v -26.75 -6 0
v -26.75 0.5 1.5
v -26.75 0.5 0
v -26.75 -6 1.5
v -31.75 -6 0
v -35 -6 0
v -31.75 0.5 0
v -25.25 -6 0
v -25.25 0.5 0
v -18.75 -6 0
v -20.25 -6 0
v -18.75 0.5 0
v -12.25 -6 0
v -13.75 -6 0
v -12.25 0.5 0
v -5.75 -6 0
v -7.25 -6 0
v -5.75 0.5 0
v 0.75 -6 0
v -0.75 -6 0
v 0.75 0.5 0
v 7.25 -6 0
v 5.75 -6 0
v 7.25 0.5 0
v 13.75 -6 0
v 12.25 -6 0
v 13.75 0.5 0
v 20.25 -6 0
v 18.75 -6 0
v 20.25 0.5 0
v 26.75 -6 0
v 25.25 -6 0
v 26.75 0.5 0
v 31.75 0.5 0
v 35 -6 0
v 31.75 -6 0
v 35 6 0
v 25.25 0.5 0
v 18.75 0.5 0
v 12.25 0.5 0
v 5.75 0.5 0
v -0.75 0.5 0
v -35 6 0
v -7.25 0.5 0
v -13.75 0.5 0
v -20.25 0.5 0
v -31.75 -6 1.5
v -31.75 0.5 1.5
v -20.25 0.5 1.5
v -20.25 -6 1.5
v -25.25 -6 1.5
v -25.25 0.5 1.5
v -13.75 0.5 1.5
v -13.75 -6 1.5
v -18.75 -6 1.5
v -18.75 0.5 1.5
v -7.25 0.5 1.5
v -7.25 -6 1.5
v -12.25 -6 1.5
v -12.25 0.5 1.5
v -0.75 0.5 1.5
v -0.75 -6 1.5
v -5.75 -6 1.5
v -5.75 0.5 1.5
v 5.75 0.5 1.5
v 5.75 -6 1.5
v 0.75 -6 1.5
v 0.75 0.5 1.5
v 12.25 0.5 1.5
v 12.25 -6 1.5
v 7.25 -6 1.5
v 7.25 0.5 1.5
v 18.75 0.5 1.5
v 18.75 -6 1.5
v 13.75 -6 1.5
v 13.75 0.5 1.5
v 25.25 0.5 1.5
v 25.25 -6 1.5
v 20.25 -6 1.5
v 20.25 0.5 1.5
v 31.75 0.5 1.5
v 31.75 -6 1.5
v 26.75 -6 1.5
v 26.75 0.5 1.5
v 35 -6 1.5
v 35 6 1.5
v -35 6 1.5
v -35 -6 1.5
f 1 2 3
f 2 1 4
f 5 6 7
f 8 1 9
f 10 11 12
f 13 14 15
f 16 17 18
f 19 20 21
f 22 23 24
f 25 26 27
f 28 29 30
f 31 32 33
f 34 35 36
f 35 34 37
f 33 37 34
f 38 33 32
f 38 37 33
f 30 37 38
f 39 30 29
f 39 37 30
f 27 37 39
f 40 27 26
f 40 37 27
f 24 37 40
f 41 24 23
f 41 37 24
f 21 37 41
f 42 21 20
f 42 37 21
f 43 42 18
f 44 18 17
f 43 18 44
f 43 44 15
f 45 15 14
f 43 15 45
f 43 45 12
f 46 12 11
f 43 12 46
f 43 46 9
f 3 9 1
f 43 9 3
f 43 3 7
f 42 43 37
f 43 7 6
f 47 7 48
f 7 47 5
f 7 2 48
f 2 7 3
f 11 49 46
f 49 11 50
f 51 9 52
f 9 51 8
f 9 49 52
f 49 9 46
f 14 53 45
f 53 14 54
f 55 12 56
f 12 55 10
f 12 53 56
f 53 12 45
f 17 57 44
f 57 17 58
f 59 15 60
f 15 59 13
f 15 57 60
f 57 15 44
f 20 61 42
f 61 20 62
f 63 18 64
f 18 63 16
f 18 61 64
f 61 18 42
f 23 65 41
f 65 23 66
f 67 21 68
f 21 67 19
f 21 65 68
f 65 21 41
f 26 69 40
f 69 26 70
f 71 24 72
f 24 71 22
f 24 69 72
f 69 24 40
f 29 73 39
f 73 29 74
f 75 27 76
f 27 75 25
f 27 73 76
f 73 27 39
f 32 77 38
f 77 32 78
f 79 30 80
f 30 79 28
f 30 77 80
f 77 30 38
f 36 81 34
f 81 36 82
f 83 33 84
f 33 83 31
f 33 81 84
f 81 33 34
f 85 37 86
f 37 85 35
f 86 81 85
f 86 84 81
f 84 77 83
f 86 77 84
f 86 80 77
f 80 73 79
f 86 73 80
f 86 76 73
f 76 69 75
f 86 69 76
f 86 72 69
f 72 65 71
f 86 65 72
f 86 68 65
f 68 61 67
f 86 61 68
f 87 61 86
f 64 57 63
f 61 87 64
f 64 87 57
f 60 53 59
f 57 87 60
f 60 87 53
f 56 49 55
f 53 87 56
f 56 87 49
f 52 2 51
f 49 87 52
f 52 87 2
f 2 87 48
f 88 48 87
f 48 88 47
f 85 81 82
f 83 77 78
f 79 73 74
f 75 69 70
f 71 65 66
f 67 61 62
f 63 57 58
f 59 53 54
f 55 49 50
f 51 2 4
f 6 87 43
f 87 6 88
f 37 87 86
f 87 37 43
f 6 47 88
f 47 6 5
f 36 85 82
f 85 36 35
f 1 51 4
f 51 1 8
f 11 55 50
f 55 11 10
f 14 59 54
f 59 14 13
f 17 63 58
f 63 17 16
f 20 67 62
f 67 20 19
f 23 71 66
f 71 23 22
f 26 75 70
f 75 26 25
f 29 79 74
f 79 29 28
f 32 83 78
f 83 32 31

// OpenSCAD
// 10-well agarose gel comb - printed lying flat
// Units: mm

plate_t     = 1.5;   // plate thickness (Z)
spine_len   = 70;    // spine length (X)
spine_w     = 12;    // spine width (Y)
teeth_n     = 10;    // number of teeth
teeth_w     = 5;     // tooth width (X)
teeth_l     = 12;    // tooth length (Y)
gap         = 1.5;   // gap between teeth (X)
overcut     = 0.5;   // cutter overshoot past faces

pitch = teeth_w + gap;
x0    = -(teeth_n - 1) * pitch / 2;

difference() {
    // Spine
    translate([-spine_len / 2, -spine_w / 2, 0])
        cube([spine_len, spine_w, plate_t]);

    // Teeth
    for (i = [0 : teeth_n - 1])
        translate([x0 + i * pitch - teeth_w / 2, -teeth_l, 0])
            cube([teeth_w, teeth_l + overcut, plate_t + overcut]);
}
